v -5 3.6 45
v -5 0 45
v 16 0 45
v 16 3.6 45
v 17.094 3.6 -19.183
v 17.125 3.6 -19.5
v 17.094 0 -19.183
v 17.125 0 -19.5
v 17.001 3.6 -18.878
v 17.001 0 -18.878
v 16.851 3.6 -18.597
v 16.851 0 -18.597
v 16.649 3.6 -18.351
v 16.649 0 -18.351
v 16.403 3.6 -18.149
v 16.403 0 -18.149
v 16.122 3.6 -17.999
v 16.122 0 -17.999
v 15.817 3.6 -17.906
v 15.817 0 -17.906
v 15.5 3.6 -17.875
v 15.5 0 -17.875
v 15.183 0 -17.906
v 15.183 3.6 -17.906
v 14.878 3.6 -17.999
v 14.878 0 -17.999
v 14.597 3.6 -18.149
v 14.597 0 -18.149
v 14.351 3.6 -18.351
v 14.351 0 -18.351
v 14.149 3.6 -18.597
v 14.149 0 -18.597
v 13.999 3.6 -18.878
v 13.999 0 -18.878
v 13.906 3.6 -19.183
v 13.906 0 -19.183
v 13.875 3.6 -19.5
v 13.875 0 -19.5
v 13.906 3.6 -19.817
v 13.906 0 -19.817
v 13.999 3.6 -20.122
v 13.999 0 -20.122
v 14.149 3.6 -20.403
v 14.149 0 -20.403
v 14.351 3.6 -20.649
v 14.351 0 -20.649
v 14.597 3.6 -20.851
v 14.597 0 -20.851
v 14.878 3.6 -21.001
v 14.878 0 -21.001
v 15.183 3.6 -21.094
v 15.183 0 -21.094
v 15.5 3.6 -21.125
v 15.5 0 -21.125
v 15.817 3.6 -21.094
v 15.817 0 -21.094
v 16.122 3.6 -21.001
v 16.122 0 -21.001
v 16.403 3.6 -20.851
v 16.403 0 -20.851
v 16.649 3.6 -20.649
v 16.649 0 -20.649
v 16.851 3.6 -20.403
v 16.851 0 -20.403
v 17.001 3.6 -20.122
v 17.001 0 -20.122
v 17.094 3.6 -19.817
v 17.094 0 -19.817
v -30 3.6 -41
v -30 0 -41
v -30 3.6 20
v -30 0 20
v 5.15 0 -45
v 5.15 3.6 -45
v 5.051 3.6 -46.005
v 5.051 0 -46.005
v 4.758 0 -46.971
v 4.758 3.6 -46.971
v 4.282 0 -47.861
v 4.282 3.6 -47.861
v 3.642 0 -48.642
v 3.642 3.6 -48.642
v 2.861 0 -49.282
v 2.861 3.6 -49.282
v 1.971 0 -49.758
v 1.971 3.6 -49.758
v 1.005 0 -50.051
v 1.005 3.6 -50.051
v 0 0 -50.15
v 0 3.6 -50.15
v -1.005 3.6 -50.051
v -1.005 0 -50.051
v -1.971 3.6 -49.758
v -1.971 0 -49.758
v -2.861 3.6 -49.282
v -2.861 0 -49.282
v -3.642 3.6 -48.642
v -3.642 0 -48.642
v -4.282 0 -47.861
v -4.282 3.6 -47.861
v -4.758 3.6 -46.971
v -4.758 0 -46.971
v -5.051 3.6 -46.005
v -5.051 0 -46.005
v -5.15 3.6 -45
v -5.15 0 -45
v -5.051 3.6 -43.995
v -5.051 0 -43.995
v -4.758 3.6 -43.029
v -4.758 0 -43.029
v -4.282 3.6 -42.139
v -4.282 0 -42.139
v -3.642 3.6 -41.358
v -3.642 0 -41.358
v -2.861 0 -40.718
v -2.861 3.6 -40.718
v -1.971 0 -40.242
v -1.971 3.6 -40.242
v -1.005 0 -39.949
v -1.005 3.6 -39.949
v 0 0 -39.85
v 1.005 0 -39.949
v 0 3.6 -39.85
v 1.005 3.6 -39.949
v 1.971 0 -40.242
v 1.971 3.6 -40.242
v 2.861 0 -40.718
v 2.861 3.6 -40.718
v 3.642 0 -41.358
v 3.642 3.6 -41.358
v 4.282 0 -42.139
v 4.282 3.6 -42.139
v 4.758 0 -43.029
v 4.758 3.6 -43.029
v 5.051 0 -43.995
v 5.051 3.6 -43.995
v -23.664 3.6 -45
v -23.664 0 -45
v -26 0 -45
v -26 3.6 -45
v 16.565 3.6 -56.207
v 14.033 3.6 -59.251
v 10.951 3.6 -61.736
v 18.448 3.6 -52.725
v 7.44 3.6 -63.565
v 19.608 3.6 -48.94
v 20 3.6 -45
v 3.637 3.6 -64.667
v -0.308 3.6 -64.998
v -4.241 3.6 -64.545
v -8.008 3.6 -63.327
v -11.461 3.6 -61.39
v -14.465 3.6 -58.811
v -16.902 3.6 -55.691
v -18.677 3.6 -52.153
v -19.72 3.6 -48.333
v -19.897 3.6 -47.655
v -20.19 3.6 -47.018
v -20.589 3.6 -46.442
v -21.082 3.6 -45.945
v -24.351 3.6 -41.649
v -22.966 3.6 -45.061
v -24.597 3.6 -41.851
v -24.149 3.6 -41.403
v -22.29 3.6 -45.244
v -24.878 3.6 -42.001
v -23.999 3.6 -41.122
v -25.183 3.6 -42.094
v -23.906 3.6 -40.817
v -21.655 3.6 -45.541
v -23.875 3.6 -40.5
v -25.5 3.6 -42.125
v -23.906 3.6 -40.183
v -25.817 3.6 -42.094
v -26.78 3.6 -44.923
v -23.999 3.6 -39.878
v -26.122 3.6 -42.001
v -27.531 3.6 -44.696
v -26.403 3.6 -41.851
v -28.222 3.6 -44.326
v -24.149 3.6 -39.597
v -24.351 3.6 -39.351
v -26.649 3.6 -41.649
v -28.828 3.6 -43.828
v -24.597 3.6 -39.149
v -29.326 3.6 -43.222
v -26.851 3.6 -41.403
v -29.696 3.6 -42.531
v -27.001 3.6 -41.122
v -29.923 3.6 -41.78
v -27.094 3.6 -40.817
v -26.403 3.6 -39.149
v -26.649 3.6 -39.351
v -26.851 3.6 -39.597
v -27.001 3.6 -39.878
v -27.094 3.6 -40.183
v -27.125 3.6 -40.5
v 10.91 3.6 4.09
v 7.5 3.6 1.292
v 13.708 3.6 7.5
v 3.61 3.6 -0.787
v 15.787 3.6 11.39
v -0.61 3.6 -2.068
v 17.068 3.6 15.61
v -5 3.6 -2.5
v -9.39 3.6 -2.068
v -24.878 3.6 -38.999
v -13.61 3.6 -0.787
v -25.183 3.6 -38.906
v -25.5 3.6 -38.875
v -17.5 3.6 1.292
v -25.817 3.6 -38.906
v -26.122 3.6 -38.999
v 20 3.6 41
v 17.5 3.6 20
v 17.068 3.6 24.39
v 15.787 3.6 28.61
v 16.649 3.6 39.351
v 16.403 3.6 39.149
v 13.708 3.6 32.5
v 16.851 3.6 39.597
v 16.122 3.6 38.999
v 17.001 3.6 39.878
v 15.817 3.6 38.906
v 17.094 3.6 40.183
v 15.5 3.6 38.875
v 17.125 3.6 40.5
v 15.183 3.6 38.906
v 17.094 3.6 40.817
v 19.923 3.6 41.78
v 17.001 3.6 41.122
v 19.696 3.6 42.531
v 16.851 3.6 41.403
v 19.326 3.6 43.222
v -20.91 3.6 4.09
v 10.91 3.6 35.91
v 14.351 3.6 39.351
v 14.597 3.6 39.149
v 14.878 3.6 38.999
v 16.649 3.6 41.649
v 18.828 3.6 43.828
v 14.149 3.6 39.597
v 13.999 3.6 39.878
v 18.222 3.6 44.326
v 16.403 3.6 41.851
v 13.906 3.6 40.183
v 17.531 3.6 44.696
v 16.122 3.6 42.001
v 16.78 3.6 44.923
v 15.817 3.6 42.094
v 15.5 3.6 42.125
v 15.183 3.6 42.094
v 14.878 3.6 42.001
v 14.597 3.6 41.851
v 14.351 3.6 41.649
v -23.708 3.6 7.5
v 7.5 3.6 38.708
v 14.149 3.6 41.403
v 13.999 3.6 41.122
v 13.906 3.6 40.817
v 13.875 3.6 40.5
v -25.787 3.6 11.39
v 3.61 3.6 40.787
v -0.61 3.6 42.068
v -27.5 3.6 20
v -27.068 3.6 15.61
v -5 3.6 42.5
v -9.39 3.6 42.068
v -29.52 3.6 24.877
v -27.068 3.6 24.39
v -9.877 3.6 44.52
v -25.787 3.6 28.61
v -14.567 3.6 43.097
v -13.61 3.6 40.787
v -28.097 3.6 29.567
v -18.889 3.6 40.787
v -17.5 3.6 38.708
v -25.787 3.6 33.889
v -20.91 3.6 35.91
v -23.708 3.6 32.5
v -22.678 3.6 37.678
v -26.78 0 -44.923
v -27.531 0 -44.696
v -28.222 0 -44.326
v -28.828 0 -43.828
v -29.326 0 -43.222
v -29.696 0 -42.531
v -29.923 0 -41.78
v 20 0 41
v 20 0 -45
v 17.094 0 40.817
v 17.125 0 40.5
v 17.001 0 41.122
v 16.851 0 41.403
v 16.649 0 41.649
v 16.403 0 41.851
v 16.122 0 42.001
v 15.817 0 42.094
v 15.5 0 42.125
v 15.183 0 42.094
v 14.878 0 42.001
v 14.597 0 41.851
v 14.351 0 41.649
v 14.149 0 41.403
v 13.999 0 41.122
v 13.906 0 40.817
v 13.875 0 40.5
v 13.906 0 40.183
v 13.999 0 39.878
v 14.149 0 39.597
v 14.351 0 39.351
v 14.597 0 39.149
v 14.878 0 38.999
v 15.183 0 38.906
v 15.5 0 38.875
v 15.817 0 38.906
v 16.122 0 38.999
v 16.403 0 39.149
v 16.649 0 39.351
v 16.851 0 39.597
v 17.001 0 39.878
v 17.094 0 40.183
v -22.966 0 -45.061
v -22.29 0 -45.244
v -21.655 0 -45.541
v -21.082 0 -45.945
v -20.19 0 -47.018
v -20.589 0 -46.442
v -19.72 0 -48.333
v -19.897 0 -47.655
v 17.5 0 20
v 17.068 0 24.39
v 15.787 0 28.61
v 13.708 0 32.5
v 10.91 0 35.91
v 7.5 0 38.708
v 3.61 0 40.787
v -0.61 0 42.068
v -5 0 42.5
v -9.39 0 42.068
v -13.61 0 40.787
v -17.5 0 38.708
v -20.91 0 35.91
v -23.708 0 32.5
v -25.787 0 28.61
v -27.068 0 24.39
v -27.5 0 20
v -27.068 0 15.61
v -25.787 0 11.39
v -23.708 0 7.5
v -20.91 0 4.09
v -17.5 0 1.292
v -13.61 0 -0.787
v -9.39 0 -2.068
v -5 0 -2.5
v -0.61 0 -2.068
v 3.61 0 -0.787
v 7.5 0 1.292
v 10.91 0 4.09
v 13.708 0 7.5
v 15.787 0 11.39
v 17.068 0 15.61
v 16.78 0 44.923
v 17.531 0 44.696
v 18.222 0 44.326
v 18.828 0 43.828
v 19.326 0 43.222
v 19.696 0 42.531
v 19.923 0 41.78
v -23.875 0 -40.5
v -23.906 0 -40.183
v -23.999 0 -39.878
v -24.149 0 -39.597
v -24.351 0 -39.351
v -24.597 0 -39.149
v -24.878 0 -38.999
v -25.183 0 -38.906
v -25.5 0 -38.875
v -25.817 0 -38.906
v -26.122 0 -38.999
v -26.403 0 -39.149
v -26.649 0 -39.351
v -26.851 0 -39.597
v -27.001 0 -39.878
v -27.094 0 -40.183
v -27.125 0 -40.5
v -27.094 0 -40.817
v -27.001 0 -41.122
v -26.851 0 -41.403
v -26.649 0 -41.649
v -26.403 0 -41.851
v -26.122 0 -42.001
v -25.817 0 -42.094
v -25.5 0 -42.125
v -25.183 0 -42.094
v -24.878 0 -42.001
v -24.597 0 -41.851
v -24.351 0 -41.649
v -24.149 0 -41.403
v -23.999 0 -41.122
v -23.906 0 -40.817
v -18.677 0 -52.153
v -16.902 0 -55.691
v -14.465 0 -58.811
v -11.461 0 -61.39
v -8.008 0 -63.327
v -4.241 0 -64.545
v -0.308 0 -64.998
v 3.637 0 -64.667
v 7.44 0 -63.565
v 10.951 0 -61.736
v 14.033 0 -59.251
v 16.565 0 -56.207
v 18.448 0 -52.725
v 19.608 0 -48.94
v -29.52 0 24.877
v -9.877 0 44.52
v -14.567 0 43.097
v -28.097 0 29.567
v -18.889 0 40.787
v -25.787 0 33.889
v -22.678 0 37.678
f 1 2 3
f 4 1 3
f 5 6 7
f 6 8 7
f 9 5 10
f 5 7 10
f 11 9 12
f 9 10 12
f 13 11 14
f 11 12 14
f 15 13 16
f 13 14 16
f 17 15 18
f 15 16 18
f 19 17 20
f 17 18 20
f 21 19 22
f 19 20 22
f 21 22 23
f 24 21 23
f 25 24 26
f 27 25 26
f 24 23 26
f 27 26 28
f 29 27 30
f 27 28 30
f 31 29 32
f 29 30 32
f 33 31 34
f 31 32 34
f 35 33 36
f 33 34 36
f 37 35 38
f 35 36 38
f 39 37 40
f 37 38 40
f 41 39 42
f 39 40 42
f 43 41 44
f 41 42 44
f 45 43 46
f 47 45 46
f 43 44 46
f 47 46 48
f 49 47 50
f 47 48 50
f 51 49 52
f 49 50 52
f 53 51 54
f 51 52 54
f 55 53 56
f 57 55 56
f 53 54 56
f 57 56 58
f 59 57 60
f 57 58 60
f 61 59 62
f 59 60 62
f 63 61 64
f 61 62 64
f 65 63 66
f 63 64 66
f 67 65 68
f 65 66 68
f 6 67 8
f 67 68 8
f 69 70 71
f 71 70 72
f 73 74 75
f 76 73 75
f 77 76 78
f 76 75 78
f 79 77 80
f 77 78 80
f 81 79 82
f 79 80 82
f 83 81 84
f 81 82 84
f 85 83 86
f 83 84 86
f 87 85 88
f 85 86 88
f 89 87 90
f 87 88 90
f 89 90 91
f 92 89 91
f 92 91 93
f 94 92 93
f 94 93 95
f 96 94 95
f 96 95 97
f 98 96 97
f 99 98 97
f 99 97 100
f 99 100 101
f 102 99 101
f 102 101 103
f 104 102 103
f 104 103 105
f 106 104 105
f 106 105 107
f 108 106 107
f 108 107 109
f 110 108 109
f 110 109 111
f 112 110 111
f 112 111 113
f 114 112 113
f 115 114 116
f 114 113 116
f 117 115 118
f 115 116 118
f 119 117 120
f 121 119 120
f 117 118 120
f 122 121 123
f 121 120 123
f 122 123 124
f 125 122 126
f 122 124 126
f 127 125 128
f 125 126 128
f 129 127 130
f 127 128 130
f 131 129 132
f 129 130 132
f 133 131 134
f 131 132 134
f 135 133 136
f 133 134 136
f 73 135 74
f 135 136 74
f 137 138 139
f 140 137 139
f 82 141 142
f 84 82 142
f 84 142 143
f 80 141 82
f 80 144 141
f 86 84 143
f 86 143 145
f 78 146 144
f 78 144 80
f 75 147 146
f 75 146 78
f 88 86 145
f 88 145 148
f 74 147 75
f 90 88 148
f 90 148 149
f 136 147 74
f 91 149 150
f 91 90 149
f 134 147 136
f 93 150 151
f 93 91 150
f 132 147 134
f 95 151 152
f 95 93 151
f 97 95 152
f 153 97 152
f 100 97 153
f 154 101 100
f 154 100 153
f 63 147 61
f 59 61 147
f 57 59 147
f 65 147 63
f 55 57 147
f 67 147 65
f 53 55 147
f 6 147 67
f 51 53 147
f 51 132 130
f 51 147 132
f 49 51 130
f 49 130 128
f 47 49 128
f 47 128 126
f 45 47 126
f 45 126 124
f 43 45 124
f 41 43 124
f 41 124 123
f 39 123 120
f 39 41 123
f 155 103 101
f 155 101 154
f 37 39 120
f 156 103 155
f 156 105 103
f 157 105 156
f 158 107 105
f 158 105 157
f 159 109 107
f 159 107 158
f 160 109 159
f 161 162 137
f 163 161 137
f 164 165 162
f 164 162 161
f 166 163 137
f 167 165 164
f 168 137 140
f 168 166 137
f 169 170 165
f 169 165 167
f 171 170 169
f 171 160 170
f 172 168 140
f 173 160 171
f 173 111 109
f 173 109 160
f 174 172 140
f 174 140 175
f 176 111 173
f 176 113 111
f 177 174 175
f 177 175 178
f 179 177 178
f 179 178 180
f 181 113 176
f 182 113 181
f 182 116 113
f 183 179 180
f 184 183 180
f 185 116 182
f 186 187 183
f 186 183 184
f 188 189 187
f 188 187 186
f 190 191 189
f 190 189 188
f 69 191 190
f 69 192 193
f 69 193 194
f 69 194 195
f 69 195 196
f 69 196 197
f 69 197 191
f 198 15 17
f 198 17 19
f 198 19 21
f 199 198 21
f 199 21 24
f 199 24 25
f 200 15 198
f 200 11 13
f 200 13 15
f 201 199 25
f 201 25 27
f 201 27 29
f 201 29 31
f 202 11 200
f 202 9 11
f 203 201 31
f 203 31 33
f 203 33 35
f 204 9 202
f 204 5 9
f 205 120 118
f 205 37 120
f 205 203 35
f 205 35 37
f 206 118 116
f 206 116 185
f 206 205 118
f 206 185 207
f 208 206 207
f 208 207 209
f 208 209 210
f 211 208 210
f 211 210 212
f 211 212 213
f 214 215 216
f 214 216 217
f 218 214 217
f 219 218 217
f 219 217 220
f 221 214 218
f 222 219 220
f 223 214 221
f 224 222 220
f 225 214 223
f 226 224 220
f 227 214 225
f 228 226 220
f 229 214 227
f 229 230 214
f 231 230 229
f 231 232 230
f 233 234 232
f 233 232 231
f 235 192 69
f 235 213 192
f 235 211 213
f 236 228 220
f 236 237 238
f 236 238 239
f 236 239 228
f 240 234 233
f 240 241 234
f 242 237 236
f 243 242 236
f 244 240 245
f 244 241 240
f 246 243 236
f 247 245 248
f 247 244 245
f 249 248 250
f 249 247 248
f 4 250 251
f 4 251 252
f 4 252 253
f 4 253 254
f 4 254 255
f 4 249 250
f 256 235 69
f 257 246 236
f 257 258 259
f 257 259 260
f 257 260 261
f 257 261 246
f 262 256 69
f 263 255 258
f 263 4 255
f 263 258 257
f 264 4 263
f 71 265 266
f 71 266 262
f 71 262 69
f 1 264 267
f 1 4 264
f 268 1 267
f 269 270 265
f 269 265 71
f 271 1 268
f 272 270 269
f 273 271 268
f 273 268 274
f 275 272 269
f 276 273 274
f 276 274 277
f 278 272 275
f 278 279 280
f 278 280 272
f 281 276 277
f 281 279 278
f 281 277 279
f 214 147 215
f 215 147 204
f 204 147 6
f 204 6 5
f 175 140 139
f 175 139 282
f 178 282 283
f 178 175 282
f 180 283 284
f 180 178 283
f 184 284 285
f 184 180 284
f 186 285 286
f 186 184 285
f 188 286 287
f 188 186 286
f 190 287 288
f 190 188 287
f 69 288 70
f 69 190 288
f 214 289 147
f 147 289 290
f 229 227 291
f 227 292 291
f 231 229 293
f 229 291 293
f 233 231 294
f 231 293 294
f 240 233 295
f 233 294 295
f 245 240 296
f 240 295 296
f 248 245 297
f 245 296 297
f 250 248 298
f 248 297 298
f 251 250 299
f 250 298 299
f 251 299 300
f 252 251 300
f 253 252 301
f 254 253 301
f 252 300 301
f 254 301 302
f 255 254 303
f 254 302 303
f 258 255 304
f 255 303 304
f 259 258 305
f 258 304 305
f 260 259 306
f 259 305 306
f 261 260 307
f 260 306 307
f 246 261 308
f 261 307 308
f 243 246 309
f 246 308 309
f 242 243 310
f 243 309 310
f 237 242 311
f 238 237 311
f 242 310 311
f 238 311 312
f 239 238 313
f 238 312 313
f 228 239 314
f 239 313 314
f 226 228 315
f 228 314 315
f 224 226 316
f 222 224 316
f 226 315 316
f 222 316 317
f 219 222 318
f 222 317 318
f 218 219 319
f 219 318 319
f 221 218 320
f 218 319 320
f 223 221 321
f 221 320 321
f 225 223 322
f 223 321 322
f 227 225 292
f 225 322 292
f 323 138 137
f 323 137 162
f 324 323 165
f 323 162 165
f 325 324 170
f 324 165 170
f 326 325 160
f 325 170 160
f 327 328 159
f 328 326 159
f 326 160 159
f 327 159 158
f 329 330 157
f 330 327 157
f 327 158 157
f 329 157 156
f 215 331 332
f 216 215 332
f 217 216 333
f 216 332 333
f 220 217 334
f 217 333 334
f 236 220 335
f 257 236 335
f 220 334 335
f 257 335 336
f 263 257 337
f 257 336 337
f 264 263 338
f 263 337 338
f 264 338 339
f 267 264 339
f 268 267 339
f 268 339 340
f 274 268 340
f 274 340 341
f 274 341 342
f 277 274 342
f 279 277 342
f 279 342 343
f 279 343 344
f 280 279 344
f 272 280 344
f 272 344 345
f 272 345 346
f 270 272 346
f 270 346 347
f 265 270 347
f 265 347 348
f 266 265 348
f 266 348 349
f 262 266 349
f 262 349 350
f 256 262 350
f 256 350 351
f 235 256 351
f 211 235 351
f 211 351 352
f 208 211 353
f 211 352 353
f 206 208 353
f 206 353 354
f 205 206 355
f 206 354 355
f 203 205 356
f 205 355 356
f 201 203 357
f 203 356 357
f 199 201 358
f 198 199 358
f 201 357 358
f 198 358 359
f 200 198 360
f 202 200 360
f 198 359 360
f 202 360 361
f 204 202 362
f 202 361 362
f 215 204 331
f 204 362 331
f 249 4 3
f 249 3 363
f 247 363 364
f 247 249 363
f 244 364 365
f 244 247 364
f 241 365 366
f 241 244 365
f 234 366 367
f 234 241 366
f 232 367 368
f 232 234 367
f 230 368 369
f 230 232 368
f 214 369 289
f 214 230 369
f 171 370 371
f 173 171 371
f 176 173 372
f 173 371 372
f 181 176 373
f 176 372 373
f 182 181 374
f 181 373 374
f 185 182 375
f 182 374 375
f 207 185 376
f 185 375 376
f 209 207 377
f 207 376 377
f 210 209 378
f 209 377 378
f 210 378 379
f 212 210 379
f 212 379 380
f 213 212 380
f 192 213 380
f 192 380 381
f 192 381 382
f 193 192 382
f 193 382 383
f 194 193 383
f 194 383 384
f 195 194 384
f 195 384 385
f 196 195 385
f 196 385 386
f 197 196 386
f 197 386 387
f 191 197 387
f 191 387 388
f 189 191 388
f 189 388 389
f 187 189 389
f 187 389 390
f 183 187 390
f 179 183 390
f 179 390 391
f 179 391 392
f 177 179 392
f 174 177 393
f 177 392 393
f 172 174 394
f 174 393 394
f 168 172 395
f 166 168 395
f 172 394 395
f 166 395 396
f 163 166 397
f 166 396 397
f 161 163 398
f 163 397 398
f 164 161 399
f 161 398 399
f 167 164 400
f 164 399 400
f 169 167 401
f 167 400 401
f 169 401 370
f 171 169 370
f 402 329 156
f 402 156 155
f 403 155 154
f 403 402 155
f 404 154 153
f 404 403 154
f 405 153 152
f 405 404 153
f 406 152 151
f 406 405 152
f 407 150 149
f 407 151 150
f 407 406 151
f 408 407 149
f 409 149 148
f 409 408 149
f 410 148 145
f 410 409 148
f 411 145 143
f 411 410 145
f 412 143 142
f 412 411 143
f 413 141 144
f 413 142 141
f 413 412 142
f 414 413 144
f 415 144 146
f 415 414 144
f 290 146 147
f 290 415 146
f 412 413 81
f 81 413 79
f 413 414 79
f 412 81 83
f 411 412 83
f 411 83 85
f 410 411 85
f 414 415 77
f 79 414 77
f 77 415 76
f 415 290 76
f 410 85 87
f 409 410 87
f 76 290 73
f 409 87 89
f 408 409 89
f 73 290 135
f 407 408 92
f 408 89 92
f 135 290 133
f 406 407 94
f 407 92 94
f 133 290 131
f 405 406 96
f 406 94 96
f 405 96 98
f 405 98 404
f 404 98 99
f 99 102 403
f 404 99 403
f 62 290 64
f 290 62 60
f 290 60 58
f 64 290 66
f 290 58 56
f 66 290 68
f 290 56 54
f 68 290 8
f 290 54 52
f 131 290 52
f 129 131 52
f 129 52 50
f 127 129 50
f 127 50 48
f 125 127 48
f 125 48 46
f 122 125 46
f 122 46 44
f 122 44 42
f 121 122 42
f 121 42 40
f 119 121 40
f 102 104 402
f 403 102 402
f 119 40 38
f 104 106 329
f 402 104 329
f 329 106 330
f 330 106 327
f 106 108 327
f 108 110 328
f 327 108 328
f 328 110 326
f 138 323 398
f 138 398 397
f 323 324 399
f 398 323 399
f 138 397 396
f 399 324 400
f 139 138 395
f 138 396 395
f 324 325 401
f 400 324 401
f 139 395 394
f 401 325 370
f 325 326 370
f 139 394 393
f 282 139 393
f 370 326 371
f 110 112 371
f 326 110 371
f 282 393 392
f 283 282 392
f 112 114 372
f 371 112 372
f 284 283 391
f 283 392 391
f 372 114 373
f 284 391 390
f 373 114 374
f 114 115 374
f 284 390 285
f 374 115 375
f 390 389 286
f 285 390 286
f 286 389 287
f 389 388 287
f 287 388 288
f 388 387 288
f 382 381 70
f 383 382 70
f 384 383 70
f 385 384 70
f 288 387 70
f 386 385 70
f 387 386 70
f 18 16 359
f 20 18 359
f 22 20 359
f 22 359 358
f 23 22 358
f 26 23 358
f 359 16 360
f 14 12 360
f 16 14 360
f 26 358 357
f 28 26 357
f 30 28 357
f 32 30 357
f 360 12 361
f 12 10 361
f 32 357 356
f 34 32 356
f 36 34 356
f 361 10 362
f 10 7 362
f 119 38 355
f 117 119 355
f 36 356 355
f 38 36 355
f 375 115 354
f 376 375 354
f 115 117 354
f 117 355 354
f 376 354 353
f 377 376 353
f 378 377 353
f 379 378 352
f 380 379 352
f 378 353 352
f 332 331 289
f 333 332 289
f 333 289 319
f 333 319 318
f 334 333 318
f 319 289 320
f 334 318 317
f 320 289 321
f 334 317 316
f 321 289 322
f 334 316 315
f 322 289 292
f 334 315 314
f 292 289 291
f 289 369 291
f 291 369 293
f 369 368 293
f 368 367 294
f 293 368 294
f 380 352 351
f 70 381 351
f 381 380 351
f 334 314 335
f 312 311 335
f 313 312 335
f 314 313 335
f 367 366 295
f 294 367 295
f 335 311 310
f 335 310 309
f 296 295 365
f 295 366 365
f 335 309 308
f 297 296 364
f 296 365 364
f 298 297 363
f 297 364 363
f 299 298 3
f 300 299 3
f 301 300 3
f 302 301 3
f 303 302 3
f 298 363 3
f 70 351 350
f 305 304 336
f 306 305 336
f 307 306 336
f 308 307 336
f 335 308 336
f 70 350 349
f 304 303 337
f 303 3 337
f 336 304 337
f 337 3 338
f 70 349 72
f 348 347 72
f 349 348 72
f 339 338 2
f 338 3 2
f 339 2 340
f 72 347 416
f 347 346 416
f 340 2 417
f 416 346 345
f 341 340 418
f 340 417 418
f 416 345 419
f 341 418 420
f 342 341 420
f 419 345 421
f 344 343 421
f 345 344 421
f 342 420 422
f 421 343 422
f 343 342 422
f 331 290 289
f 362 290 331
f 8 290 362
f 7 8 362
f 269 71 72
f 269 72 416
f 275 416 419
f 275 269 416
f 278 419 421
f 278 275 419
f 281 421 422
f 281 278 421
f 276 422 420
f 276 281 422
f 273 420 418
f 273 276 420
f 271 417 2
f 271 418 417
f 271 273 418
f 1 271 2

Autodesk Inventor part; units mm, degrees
ref_plane "YZ Plane" through (0, 0, 0) normal (1, 0, 0) x (0, 1, 0)
ref_plane "XZ Plane" through (0, 0, 0) normal (0, 1, 0) x (-1, 0, 0)
ref_plane "XY Plane" through (0, 0, 0) normal (0, 0, 1) x (1, 0, 0)
sketch "Sketch1" plane through (0, 0, 0) normal (0, 1, 0) x (-1, 0, 0)
  line L0 (20, 45) -> (-20, 45)
  line L1 (-20, 45) -> (-20, -45)
  line L2 (-20, -45) -> (20, -45)
  line L3 (20, -45) -> (20, 45)
  line L4 (20, 45) -> (-20, -45) construction
  line L5 (-20, 45) -> (20, -45) construction
  arc A0 (-20, -45) -> (20, -45) centre (0, -45) ccw
  line L6 (20, -45) -> (30, -45)
  line L7 (30, -45) -> (30, 45)
  line L8 (30, 45) -> (20, 45)
  line L9 (20, 45) -> (20, -45)
  point P0 (0, 0)
  dimension "d0" = 40
  dimension "d1" = 90
  dimension "d7" = 10
  dimension "d8" = 90
extrude "Extrusion1" add sketch "Sketch1" along normal blind 3.6
sketch "Sketch2" plane through (0, 3.6, 0) normal (0, 1, 0) x (1, 0, 0)
  arc A0 (20, 45) -> (-20, 45) centre (0, 45) ccw projected
  circle A1 centre (0, 45) radius 5.15
  point P0 (0, 0)
  dimension "d4" = 10.3
extrude "Extrusion2" cut sketch "Sketch2" against normal blind 3.6
fillet "Fillet1" radius 4 3 edges at (-20, 1.8, -45) (-30, 1.8, -45) (20, 1.8, 45)
sketch "Sketch3" plane through (0, 0, 0) normal (0, -1, 0) x (1, 0, 0)
  circle A0 centre (-5, 20) radius 22.5
  line L0 (20, 41) -> (20, -45) projected
  line L1 (-30, 45) -> (16, 45) projected
  point P0 (0, 0)
  point P1 (-26, 45)
  dimension "d10" = 45
  dimension "d11" = 25
  dimension "d12" = 25
extrude "Extrusion3" cut sketch "Sketch3" against normal blind 10
sketch "Sketch4" plane through (0, 0, 0) normal (0, -1, 0) x (1, 0, 0)
  circle A0 centre (15.5, 40.5) radius 1.625
  circle A1 centre (-25.5, -40.5) radius 1.625
  circle A2 centre (15.5, -19.5) radius 1.625
  line L0 (-30, -41) -> (-30, 45) projected
  line L1 (-23.6643, -45) -> (-26, -45) projected
  line L2 (20, 41) -> (20, -45) projected
  line L3 (-30, 45) -> (16, 45) projected
  point P0 (0, 0)
  point P1 (-30, 41)
  point P2 (-26, 45)
  dimension "d15" = 3.25
  dimension "d17" = 3.25
  dimension "d18" = 3.25
  dimension "d19" = 4.5
  dimension "d20" = 4.5
  dimension "d21" = 4.5
  dimension "d23" = 4.5
  dimension "d24" = 4.5
  dimension "d27" = 60
extrude "Extrusion4" cut sketch "Sketch4" against normal blind 10
fillet "Fillet2" radius 25 1 edges at (-30, 1.8, 45)
properties part number "p1"
